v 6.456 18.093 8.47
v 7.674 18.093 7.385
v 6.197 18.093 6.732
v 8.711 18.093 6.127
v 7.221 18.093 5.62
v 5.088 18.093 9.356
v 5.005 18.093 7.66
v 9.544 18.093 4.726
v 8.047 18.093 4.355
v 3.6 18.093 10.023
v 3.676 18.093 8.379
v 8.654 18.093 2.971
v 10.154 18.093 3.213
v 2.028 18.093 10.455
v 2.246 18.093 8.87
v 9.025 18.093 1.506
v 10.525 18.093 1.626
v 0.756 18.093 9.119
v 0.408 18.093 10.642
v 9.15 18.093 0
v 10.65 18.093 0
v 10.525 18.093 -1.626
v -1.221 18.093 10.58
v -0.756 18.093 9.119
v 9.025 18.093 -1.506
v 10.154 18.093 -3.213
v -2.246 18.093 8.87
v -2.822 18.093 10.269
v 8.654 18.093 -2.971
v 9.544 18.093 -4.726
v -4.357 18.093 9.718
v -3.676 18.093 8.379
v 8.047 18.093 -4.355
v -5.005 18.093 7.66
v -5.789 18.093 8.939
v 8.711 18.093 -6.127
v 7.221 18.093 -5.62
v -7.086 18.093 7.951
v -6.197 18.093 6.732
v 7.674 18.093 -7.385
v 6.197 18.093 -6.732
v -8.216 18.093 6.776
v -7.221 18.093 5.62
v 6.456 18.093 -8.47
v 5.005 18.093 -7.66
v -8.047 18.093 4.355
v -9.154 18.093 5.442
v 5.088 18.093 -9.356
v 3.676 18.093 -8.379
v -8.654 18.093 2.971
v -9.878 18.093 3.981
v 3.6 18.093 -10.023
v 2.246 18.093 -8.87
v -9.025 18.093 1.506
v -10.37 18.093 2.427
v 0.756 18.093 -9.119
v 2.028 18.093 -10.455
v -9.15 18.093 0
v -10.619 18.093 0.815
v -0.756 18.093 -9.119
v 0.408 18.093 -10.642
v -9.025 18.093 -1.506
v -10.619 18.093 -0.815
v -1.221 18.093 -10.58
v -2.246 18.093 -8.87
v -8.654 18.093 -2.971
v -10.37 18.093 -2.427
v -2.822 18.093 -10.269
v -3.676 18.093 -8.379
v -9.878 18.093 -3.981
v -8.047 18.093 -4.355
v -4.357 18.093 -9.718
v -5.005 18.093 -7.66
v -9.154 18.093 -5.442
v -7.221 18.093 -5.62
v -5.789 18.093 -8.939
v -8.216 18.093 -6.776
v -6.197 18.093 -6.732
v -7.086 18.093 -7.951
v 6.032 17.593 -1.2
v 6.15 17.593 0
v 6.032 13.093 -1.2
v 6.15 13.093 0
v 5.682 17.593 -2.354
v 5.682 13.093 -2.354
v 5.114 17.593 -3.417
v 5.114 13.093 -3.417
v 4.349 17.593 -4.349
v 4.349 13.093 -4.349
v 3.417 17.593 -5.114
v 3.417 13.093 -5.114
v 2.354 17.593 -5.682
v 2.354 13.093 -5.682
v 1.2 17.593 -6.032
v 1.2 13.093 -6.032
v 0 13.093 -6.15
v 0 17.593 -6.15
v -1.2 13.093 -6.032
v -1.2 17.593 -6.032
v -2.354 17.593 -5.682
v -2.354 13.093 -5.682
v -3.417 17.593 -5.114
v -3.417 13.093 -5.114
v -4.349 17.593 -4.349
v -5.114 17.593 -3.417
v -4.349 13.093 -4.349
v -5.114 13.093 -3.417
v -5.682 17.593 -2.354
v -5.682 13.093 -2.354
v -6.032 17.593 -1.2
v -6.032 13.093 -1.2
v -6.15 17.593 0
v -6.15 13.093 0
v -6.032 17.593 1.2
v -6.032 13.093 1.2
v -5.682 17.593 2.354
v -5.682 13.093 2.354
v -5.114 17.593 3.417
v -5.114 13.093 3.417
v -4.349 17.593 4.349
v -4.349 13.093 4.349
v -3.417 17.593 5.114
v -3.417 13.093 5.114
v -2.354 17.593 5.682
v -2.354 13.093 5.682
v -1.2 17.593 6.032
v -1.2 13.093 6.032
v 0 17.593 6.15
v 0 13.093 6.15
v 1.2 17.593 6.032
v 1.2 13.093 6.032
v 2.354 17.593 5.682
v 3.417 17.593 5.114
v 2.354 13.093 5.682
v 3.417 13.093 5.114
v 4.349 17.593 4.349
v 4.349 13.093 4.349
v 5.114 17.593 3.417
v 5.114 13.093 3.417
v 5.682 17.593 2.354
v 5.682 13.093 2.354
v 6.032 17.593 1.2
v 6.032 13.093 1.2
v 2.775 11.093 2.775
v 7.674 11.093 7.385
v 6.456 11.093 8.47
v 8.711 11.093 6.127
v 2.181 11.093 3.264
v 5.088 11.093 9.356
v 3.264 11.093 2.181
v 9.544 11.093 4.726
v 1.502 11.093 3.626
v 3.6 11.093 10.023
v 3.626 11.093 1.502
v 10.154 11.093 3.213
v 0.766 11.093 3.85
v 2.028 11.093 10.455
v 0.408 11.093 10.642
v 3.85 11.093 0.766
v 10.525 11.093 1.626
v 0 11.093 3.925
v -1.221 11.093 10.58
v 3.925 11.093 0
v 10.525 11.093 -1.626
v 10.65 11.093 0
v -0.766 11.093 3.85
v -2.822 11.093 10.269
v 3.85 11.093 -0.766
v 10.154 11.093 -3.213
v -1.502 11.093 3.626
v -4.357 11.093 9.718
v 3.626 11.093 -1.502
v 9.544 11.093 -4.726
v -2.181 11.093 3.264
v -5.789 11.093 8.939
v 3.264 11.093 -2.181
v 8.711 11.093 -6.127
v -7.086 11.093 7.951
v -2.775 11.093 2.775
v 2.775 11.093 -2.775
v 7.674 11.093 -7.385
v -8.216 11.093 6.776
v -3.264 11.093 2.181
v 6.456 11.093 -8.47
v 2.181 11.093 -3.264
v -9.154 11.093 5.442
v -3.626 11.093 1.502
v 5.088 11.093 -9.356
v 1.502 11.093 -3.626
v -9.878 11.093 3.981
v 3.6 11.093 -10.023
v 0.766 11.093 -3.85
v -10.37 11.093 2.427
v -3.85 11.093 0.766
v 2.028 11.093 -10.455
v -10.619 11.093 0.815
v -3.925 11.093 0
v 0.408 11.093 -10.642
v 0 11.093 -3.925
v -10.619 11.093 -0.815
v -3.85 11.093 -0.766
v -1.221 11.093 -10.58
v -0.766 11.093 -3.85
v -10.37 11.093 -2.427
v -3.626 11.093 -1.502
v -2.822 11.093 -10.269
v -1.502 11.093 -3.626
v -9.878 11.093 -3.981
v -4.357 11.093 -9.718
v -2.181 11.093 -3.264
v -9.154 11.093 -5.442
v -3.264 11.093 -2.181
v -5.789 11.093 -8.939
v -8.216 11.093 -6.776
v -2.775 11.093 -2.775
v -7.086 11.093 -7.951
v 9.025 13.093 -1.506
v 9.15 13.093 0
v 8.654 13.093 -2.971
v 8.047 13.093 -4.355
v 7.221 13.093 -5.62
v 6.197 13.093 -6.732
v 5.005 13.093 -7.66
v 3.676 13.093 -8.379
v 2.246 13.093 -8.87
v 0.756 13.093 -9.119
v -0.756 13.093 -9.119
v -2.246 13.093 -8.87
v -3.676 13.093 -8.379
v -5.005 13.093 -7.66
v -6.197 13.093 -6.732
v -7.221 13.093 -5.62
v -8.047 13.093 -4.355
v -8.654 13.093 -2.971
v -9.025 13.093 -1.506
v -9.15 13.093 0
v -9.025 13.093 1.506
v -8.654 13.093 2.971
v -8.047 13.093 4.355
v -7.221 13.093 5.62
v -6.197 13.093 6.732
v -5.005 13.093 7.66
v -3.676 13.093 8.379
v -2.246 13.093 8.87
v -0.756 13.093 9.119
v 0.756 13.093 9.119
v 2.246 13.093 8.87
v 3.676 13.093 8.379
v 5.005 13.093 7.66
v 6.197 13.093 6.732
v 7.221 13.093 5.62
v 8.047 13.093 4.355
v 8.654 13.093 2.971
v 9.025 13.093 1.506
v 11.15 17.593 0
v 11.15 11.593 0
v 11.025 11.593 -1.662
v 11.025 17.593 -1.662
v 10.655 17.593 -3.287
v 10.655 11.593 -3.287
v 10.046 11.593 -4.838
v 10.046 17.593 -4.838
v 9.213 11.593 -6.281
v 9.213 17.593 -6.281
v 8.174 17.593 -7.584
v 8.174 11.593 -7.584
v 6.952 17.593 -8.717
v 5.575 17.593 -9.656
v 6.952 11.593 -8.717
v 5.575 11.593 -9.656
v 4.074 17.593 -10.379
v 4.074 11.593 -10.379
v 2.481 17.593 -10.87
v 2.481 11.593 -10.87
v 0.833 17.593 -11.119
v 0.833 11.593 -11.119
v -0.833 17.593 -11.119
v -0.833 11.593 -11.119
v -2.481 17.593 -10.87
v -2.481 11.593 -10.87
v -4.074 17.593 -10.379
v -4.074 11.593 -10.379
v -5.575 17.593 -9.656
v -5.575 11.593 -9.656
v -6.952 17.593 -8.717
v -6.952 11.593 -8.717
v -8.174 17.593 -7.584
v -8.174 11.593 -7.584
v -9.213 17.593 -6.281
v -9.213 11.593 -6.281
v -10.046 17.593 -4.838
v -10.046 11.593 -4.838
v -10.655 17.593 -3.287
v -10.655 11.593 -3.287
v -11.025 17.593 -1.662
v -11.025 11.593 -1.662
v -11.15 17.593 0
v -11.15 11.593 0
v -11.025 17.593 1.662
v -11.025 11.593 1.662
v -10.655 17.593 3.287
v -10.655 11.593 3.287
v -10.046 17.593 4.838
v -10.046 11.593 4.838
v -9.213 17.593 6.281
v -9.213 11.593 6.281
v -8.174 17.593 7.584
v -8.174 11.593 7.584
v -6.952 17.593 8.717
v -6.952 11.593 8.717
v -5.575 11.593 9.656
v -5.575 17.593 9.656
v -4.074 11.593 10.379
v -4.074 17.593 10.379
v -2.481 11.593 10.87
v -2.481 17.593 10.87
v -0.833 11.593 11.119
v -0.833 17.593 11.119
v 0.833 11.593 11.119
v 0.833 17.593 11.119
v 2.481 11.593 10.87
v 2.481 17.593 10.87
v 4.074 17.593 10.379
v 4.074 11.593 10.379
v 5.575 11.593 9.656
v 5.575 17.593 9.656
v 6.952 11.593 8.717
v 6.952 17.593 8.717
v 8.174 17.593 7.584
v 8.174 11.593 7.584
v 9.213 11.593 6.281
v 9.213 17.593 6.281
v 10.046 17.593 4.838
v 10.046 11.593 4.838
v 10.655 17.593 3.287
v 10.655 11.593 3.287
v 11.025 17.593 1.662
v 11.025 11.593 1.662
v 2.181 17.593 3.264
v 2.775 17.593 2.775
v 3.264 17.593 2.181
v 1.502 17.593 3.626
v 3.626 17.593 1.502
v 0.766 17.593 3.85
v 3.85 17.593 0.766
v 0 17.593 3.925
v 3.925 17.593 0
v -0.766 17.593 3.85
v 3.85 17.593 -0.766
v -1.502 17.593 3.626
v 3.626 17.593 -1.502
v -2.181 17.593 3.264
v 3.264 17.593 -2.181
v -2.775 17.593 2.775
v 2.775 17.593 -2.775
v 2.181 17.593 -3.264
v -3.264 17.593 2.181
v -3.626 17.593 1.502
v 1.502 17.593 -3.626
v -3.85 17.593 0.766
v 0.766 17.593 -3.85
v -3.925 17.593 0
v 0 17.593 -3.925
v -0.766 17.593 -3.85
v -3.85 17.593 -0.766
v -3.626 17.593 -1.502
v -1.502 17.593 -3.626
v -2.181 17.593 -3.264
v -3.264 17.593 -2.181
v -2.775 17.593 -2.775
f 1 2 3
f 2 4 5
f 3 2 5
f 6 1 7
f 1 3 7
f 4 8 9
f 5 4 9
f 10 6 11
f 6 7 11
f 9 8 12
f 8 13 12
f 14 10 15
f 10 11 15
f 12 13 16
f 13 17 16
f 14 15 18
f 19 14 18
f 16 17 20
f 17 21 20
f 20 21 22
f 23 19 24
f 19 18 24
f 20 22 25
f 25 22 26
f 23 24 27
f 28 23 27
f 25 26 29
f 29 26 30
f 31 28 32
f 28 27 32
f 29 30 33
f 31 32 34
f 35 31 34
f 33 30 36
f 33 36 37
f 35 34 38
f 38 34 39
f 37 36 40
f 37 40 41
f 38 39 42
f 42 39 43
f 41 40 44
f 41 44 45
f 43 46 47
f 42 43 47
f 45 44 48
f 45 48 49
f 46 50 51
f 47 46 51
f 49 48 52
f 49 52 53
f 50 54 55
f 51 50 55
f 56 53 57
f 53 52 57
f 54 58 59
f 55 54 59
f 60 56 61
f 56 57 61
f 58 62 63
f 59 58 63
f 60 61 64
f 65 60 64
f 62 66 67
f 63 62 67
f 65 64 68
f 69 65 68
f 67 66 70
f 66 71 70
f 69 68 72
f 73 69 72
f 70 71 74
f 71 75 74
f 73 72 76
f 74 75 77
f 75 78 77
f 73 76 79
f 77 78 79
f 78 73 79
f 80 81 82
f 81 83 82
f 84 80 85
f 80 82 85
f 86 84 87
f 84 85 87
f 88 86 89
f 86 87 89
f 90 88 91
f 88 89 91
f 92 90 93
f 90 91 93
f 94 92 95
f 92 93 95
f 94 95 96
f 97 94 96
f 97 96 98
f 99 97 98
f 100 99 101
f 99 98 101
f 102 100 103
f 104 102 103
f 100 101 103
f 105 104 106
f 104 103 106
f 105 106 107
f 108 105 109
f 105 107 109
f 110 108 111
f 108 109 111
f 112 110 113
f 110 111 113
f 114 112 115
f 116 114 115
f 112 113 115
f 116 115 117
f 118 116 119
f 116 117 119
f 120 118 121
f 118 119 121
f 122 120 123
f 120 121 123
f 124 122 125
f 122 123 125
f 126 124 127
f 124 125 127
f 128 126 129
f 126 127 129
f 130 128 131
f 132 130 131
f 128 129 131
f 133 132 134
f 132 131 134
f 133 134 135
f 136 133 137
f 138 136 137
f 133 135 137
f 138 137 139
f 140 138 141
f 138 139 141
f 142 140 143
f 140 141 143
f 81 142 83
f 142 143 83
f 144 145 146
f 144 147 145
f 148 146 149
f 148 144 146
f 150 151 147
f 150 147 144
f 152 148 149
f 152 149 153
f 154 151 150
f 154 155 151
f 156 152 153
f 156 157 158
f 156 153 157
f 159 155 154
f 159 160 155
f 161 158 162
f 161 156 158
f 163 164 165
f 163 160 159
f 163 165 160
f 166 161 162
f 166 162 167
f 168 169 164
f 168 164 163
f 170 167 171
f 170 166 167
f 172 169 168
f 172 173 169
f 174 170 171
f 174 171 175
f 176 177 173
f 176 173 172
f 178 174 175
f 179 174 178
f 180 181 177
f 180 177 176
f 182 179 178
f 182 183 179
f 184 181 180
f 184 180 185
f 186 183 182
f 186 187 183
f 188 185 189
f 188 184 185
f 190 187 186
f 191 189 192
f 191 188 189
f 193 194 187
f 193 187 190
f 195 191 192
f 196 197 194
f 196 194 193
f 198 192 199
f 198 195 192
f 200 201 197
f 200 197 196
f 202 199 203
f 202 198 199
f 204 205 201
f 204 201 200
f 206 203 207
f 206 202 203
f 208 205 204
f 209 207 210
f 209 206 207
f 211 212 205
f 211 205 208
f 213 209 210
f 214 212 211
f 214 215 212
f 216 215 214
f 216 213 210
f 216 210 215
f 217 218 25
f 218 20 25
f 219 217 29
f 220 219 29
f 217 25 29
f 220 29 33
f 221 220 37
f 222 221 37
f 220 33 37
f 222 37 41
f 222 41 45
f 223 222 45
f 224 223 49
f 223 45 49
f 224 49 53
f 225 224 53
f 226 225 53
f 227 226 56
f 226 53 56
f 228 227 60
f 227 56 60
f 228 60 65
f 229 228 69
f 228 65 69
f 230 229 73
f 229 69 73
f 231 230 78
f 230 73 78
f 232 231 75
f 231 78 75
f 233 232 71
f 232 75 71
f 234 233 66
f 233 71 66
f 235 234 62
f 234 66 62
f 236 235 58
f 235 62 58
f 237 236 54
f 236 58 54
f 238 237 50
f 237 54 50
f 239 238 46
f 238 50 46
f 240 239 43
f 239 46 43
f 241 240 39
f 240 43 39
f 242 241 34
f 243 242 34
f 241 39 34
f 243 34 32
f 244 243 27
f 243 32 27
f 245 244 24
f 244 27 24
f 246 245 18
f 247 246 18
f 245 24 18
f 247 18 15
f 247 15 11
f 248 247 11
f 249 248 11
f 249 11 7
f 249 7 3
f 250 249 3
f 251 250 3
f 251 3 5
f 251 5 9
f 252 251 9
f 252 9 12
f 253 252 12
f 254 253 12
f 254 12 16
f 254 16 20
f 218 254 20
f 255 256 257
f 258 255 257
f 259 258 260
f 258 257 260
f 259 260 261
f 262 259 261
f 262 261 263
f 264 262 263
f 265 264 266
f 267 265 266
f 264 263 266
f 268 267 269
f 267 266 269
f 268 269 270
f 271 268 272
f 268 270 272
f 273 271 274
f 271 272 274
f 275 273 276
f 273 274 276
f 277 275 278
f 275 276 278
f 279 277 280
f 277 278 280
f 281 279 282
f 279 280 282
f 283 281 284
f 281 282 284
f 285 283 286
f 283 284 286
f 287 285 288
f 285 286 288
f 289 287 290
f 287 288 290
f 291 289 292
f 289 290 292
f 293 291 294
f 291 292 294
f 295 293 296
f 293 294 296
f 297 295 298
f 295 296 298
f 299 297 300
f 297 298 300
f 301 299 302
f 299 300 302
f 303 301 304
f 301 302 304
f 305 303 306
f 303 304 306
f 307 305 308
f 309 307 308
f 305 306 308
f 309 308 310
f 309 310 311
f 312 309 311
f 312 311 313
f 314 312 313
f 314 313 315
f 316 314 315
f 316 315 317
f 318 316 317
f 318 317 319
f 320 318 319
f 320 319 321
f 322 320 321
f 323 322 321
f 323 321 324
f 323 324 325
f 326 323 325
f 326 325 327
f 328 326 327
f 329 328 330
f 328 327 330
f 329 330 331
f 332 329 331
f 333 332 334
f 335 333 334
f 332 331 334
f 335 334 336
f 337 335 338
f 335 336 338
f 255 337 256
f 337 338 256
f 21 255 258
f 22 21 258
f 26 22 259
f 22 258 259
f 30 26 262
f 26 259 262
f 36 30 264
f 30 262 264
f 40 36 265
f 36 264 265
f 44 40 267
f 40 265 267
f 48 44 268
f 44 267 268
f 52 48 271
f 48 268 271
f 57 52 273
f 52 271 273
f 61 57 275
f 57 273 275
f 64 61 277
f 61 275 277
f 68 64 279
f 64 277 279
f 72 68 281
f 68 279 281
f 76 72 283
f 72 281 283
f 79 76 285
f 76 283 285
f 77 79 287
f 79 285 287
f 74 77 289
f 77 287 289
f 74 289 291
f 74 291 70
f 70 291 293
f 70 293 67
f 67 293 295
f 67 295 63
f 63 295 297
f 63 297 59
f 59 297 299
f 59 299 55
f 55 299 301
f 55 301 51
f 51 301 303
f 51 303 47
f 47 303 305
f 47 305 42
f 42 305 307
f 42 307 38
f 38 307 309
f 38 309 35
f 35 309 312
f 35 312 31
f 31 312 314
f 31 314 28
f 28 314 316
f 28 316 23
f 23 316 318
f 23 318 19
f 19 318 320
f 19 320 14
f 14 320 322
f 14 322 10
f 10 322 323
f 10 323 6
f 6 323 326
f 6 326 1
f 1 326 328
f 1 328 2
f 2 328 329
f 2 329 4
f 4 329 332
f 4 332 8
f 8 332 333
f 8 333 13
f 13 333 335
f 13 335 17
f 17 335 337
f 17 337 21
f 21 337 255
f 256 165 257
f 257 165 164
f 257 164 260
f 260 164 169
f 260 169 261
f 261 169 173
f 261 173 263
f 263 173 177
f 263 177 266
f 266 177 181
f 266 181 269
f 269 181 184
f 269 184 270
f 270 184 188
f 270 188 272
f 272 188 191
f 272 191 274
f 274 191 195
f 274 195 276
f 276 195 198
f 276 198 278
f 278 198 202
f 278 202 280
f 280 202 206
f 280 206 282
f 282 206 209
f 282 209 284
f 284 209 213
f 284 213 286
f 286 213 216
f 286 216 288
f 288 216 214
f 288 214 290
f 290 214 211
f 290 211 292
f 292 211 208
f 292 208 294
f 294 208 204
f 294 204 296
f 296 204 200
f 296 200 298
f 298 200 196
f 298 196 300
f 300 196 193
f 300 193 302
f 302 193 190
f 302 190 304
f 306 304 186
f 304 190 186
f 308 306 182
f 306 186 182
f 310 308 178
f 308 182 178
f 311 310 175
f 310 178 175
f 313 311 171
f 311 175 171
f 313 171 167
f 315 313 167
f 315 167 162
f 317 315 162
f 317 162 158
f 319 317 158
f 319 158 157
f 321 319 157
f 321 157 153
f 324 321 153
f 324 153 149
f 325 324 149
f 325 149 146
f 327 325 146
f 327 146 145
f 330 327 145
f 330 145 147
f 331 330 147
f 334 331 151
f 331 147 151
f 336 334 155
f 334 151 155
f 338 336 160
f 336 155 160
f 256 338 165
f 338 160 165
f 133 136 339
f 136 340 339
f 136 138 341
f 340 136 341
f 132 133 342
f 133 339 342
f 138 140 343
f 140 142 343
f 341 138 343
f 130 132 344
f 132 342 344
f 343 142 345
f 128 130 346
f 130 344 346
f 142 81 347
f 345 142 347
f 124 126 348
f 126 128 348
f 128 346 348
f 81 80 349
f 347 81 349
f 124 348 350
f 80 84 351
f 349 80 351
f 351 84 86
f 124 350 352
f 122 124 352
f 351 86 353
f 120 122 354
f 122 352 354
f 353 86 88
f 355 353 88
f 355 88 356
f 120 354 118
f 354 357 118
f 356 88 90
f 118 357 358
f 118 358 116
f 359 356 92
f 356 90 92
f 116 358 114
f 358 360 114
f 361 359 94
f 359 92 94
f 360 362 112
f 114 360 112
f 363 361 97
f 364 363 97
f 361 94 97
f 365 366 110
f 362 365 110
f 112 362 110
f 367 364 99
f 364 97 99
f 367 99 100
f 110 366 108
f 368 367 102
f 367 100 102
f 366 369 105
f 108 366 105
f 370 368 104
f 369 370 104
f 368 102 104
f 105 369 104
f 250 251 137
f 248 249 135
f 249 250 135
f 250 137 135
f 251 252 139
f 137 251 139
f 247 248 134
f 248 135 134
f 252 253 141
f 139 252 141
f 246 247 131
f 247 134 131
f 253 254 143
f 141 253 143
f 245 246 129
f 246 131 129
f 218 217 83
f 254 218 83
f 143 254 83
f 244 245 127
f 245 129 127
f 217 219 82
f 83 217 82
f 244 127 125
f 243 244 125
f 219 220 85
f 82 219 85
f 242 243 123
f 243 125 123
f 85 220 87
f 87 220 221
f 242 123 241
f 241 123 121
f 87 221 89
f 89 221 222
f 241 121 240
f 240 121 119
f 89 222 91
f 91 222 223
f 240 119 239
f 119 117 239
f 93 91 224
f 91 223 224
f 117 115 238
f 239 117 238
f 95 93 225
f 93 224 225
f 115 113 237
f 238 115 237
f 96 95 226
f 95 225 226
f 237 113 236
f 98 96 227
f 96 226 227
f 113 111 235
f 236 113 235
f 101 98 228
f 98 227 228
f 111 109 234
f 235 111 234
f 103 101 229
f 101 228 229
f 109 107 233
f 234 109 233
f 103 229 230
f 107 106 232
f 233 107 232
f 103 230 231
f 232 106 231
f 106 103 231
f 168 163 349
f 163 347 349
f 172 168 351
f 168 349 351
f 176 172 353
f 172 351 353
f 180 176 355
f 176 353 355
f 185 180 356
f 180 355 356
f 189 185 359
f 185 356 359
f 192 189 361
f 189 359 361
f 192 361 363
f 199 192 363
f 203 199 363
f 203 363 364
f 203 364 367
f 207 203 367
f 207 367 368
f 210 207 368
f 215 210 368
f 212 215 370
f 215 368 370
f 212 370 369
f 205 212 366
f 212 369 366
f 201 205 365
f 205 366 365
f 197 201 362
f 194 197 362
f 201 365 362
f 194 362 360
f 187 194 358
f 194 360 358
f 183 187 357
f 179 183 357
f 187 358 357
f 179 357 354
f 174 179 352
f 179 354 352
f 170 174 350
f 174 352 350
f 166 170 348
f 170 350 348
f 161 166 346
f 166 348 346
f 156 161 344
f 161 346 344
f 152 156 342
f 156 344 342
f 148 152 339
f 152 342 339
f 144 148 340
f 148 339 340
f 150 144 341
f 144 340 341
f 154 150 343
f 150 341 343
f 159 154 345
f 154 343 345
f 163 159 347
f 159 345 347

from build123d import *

# Parameters (mm, degrees)
CHAMFER1_SIZE = 0.5


with BuildPart() as part:
    # Sketch1 → Revolve1 (revolve)
    with BuildSketch(Plane.XY):
        Polygon((3.925, 17.592522397), (6.15, 17.592522397), (6.15, 13.092522397), (9.15, 13.092522397), (9.15, 18.092522397), (11.15, 18.092522397), (11.15, 11.092522397), (9.662817283, 11.092522397), (3.925, 11.092522397), align=None)
    revolve(axis=Axis((0, 0, 0), (0, 1, 0)))

    # Chamfer1
    chamfer1_edges = [part.edges().sort_by_distance(p)[0] for p in [
        (-11.15, 18.092522397, 0),
        (-11.15, 11.092522397, 0),
    ]]
    chamfer(chamfer1_edges, length=CHAMFER1_SIZE)


solid = part.part
